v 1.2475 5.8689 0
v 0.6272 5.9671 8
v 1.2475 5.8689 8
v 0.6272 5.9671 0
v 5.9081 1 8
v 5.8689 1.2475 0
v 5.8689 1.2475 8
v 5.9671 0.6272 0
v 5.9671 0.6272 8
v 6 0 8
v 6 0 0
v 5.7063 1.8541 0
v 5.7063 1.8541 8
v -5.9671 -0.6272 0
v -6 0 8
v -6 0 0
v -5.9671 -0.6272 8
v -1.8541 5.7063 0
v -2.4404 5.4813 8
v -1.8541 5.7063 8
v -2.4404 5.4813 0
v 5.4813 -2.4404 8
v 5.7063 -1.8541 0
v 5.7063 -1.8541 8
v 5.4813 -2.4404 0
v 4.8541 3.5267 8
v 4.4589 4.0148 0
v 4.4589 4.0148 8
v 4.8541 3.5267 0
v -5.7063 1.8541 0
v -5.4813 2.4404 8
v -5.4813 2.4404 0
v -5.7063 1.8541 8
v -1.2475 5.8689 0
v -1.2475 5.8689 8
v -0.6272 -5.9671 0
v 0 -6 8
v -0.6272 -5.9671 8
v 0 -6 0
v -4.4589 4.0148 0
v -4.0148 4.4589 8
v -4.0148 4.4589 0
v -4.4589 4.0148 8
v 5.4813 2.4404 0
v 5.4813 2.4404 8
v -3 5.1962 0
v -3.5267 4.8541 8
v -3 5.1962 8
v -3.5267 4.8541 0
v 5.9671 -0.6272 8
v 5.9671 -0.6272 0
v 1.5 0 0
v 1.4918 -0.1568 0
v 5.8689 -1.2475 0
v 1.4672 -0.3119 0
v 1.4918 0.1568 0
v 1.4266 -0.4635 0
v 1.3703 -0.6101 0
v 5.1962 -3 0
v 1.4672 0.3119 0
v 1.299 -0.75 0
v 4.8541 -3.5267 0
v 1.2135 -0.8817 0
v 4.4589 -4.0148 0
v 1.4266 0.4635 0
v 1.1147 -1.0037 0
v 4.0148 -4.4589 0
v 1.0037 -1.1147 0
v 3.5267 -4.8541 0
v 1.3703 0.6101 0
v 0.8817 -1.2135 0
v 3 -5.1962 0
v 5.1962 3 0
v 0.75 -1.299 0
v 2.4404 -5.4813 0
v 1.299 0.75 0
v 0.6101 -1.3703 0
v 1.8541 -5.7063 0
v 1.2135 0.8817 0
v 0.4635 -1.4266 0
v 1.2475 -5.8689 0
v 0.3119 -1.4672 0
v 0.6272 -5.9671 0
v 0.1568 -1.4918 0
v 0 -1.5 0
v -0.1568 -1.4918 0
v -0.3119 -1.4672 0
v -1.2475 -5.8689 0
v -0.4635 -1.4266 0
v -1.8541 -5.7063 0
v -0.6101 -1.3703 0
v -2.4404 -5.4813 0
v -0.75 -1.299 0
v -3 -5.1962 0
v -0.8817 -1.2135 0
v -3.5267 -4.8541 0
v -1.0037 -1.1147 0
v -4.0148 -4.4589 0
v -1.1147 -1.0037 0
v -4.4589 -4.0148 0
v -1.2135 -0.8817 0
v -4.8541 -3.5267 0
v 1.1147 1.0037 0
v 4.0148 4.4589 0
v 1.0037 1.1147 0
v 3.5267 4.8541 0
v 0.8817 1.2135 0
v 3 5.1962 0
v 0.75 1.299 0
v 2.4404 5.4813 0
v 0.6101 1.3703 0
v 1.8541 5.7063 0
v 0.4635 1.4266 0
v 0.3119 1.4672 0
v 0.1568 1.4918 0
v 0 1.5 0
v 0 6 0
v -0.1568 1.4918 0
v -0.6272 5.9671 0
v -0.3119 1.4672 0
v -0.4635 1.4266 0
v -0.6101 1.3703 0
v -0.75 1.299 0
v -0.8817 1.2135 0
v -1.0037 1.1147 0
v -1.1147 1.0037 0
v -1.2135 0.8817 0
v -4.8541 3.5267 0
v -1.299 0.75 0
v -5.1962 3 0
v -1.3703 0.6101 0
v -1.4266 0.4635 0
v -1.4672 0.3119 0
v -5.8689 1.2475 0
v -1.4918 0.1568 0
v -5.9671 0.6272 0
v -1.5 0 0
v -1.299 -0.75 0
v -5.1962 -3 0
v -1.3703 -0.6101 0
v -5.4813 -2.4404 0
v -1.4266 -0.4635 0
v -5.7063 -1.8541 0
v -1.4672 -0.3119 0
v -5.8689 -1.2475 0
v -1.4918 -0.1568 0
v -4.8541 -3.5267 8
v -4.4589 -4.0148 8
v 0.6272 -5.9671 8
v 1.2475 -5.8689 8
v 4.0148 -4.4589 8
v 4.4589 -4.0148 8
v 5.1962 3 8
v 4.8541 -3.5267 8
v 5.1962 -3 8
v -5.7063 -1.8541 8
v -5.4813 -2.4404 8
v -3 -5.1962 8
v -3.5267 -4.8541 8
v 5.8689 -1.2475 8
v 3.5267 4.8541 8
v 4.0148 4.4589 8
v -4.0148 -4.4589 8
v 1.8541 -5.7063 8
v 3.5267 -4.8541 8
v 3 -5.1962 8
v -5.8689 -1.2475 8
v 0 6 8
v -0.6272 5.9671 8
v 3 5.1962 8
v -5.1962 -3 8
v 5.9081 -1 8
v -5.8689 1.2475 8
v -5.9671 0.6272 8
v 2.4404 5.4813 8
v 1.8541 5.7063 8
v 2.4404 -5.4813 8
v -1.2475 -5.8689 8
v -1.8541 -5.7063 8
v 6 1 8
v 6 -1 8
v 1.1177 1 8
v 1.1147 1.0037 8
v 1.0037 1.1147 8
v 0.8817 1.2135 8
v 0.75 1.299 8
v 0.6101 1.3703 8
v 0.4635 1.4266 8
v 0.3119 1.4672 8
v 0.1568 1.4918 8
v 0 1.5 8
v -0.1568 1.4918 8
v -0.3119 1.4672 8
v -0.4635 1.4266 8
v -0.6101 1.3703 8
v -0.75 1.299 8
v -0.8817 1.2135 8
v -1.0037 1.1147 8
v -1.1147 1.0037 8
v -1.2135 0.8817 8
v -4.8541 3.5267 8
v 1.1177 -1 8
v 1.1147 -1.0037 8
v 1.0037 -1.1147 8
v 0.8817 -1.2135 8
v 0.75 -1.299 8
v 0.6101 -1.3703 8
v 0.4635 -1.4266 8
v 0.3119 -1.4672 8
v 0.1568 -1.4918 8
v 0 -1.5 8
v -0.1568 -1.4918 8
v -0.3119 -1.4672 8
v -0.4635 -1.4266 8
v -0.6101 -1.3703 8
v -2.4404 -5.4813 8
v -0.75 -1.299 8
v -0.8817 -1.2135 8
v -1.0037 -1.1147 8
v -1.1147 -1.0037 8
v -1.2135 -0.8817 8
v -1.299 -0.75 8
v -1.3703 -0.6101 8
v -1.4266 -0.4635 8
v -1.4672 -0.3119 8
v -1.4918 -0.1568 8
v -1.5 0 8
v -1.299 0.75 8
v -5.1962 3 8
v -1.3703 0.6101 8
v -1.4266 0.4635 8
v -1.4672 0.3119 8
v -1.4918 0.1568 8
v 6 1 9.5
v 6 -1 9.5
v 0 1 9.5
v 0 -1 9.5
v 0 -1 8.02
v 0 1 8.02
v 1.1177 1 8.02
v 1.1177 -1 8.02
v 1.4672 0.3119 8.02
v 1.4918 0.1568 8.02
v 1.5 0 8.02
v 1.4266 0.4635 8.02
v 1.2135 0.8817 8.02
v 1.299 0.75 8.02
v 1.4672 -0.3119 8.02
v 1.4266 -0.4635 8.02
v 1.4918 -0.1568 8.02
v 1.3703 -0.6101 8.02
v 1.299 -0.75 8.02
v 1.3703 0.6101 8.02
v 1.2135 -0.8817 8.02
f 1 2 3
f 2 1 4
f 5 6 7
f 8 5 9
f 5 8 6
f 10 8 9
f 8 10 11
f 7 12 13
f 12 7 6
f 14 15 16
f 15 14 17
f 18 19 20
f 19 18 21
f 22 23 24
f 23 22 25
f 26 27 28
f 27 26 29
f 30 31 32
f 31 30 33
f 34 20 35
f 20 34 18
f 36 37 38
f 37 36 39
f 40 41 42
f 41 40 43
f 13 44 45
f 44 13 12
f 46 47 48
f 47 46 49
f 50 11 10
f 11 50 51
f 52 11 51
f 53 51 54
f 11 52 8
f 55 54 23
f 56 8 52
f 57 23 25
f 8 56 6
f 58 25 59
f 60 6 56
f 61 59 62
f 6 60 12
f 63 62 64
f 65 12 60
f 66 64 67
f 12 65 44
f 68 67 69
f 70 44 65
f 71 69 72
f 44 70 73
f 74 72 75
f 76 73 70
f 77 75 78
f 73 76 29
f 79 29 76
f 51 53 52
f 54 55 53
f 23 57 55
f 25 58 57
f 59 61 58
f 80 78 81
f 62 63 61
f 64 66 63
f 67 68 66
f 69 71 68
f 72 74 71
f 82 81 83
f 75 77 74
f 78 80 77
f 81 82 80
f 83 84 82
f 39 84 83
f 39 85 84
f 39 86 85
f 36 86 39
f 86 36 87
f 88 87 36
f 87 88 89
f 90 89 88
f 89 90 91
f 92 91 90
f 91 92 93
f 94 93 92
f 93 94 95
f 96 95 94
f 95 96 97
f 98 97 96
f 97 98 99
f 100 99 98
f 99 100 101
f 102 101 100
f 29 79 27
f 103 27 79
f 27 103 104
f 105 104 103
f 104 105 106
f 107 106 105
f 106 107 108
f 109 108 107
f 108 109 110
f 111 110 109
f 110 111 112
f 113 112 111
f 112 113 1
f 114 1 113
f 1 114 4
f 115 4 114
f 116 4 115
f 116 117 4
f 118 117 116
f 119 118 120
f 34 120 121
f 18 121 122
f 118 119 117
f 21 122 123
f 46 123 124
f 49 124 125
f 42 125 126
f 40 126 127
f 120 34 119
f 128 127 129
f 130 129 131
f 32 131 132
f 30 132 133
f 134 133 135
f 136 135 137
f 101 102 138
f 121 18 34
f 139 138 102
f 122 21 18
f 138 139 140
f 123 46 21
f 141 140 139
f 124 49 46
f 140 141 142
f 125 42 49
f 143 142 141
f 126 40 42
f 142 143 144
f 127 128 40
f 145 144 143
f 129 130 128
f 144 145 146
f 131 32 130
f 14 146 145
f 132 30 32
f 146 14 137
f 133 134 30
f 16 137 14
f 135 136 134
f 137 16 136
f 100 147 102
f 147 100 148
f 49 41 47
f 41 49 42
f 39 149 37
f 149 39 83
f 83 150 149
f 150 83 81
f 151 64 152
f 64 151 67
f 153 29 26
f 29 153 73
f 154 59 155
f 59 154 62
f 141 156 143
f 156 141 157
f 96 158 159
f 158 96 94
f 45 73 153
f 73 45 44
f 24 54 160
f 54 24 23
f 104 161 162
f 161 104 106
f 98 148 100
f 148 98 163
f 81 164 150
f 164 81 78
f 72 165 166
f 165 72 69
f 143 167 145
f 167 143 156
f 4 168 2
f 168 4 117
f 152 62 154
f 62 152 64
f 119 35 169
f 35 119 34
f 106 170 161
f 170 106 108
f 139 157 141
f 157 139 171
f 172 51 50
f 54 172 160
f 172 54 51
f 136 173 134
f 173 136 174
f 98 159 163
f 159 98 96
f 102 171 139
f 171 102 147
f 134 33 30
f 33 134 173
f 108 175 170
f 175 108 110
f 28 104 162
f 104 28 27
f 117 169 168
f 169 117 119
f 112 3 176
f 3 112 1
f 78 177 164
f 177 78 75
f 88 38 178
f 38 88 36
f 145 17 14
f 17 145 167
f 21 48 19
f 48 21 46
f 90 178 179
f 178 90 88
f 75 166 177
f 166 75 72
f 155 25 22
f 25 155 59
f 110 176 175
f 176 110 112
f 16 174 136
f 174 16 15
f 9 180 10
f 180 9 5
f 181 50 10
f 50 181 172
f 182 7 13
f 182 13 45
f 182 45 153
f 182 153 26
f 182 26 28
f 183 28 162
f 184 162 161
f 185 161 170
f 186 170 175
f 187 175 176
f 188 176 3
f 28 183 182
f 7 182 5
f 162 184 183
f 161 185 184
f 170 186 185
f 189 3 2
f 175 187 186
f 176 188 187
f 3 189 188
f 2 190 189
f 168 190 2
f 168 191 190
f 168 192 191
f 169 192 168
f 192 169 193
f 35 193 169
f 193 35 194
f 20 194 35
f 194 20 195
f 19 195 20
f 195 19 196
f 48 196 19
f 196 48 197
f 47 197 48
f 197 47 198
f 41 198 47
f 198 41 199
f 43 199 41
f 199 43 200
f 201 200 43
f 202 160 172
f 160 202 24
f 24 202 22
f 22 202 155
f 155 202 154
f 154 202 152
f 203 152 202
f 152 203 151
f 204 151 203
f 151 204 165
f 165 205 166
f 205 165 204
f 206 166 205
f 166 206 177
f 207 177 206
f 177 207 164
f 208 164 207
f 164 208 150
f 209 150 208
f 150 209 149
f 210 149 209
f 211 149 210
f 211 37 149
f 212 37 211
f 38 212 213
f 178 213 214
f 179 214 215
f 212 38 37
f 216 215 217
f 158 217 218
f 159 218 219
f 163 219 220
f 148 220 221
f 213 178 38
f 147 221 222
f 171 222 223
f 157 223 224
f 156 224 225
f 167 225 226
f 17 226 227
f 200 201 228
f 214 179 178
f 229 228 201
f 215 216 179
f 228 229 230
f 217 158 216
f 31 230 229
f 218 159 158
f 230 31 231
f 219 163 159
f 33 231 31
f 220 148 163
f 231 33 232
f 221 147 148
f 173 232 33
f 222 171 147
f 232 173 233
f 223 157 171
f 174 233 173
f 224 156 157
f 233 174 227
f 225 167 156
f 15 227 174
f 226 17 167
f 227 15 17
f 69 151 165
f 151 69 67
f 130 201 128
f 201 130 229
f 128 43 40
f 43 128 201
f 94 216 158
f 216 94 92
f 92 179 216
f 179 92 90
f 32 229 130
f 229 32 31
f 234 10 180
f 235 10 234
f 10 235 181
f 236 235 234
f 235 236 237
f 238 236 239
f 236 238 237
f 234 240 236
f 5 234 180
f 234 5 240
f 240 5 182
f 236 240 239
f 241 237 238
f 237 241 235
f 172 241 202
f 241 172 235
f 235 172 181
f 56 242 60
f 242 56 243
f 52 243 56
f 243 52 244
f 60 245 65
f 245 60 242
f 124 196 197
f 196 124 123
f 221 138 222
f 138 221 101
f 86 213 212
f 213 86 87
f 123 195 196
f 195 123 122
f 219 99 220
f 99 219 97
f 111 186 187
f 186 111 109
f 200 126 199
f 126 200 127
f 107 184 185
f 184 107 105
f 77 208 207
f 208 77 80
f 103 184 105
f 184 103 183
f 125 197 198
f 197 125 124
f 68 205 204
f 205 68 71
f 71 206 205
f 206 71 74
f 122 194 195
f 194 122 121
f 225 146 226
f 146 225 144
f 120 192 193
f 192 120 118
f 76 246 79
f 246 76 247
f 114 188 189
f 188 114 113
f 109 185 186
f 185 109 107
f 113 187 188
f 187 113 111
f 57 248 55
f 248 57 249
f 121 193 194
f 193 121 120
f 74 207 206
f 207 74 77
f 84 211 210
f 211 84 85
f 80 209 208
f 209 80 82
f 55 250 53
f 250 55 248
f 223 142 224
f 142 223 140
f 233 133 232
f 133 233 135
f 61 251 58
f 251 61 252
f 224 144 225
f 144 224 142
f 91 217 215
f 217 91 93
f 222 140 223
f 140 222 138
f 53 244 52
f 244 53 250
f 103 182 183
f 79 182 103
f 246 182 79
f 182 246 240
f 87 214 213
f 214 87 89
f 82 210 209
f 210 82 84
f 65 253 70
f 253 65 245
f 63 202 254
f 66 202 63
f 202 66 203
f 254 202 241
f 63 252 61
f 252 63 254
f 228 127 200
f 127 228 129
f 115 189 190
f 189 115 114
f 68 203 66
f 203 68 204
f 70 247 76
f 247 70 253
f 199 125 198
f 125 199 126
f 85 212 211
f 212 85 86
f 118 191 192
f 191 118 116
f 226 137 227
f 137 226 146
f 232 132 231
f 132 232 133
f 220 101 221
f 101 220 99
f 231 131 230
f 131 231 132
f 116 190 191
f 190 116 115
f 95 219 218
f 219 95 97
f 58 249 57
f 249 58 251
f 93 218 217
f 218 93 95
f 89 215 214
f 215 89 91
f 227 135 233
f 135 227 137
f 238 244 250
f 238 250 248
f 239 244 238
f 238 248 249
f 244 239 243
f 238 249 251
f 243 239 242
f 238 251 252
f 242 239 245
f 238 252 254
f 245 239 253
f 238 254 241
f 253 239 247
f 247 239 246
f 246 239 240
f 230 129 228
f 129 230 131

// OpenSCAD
// Pointer control knob.
$fn = 60;
eps = 0.02;
bore_d = 3;
knob_d = 12;
knob_h = 8;
difference() { union() { cylinder(d=knob_d,h=knob_h); translate([0,-1,knob_h]) cube([knob_d/2,2,1.5]); } translate([0,0,-eps]) cylinder(d=bore_d,h=knob_h+2*eps); }
